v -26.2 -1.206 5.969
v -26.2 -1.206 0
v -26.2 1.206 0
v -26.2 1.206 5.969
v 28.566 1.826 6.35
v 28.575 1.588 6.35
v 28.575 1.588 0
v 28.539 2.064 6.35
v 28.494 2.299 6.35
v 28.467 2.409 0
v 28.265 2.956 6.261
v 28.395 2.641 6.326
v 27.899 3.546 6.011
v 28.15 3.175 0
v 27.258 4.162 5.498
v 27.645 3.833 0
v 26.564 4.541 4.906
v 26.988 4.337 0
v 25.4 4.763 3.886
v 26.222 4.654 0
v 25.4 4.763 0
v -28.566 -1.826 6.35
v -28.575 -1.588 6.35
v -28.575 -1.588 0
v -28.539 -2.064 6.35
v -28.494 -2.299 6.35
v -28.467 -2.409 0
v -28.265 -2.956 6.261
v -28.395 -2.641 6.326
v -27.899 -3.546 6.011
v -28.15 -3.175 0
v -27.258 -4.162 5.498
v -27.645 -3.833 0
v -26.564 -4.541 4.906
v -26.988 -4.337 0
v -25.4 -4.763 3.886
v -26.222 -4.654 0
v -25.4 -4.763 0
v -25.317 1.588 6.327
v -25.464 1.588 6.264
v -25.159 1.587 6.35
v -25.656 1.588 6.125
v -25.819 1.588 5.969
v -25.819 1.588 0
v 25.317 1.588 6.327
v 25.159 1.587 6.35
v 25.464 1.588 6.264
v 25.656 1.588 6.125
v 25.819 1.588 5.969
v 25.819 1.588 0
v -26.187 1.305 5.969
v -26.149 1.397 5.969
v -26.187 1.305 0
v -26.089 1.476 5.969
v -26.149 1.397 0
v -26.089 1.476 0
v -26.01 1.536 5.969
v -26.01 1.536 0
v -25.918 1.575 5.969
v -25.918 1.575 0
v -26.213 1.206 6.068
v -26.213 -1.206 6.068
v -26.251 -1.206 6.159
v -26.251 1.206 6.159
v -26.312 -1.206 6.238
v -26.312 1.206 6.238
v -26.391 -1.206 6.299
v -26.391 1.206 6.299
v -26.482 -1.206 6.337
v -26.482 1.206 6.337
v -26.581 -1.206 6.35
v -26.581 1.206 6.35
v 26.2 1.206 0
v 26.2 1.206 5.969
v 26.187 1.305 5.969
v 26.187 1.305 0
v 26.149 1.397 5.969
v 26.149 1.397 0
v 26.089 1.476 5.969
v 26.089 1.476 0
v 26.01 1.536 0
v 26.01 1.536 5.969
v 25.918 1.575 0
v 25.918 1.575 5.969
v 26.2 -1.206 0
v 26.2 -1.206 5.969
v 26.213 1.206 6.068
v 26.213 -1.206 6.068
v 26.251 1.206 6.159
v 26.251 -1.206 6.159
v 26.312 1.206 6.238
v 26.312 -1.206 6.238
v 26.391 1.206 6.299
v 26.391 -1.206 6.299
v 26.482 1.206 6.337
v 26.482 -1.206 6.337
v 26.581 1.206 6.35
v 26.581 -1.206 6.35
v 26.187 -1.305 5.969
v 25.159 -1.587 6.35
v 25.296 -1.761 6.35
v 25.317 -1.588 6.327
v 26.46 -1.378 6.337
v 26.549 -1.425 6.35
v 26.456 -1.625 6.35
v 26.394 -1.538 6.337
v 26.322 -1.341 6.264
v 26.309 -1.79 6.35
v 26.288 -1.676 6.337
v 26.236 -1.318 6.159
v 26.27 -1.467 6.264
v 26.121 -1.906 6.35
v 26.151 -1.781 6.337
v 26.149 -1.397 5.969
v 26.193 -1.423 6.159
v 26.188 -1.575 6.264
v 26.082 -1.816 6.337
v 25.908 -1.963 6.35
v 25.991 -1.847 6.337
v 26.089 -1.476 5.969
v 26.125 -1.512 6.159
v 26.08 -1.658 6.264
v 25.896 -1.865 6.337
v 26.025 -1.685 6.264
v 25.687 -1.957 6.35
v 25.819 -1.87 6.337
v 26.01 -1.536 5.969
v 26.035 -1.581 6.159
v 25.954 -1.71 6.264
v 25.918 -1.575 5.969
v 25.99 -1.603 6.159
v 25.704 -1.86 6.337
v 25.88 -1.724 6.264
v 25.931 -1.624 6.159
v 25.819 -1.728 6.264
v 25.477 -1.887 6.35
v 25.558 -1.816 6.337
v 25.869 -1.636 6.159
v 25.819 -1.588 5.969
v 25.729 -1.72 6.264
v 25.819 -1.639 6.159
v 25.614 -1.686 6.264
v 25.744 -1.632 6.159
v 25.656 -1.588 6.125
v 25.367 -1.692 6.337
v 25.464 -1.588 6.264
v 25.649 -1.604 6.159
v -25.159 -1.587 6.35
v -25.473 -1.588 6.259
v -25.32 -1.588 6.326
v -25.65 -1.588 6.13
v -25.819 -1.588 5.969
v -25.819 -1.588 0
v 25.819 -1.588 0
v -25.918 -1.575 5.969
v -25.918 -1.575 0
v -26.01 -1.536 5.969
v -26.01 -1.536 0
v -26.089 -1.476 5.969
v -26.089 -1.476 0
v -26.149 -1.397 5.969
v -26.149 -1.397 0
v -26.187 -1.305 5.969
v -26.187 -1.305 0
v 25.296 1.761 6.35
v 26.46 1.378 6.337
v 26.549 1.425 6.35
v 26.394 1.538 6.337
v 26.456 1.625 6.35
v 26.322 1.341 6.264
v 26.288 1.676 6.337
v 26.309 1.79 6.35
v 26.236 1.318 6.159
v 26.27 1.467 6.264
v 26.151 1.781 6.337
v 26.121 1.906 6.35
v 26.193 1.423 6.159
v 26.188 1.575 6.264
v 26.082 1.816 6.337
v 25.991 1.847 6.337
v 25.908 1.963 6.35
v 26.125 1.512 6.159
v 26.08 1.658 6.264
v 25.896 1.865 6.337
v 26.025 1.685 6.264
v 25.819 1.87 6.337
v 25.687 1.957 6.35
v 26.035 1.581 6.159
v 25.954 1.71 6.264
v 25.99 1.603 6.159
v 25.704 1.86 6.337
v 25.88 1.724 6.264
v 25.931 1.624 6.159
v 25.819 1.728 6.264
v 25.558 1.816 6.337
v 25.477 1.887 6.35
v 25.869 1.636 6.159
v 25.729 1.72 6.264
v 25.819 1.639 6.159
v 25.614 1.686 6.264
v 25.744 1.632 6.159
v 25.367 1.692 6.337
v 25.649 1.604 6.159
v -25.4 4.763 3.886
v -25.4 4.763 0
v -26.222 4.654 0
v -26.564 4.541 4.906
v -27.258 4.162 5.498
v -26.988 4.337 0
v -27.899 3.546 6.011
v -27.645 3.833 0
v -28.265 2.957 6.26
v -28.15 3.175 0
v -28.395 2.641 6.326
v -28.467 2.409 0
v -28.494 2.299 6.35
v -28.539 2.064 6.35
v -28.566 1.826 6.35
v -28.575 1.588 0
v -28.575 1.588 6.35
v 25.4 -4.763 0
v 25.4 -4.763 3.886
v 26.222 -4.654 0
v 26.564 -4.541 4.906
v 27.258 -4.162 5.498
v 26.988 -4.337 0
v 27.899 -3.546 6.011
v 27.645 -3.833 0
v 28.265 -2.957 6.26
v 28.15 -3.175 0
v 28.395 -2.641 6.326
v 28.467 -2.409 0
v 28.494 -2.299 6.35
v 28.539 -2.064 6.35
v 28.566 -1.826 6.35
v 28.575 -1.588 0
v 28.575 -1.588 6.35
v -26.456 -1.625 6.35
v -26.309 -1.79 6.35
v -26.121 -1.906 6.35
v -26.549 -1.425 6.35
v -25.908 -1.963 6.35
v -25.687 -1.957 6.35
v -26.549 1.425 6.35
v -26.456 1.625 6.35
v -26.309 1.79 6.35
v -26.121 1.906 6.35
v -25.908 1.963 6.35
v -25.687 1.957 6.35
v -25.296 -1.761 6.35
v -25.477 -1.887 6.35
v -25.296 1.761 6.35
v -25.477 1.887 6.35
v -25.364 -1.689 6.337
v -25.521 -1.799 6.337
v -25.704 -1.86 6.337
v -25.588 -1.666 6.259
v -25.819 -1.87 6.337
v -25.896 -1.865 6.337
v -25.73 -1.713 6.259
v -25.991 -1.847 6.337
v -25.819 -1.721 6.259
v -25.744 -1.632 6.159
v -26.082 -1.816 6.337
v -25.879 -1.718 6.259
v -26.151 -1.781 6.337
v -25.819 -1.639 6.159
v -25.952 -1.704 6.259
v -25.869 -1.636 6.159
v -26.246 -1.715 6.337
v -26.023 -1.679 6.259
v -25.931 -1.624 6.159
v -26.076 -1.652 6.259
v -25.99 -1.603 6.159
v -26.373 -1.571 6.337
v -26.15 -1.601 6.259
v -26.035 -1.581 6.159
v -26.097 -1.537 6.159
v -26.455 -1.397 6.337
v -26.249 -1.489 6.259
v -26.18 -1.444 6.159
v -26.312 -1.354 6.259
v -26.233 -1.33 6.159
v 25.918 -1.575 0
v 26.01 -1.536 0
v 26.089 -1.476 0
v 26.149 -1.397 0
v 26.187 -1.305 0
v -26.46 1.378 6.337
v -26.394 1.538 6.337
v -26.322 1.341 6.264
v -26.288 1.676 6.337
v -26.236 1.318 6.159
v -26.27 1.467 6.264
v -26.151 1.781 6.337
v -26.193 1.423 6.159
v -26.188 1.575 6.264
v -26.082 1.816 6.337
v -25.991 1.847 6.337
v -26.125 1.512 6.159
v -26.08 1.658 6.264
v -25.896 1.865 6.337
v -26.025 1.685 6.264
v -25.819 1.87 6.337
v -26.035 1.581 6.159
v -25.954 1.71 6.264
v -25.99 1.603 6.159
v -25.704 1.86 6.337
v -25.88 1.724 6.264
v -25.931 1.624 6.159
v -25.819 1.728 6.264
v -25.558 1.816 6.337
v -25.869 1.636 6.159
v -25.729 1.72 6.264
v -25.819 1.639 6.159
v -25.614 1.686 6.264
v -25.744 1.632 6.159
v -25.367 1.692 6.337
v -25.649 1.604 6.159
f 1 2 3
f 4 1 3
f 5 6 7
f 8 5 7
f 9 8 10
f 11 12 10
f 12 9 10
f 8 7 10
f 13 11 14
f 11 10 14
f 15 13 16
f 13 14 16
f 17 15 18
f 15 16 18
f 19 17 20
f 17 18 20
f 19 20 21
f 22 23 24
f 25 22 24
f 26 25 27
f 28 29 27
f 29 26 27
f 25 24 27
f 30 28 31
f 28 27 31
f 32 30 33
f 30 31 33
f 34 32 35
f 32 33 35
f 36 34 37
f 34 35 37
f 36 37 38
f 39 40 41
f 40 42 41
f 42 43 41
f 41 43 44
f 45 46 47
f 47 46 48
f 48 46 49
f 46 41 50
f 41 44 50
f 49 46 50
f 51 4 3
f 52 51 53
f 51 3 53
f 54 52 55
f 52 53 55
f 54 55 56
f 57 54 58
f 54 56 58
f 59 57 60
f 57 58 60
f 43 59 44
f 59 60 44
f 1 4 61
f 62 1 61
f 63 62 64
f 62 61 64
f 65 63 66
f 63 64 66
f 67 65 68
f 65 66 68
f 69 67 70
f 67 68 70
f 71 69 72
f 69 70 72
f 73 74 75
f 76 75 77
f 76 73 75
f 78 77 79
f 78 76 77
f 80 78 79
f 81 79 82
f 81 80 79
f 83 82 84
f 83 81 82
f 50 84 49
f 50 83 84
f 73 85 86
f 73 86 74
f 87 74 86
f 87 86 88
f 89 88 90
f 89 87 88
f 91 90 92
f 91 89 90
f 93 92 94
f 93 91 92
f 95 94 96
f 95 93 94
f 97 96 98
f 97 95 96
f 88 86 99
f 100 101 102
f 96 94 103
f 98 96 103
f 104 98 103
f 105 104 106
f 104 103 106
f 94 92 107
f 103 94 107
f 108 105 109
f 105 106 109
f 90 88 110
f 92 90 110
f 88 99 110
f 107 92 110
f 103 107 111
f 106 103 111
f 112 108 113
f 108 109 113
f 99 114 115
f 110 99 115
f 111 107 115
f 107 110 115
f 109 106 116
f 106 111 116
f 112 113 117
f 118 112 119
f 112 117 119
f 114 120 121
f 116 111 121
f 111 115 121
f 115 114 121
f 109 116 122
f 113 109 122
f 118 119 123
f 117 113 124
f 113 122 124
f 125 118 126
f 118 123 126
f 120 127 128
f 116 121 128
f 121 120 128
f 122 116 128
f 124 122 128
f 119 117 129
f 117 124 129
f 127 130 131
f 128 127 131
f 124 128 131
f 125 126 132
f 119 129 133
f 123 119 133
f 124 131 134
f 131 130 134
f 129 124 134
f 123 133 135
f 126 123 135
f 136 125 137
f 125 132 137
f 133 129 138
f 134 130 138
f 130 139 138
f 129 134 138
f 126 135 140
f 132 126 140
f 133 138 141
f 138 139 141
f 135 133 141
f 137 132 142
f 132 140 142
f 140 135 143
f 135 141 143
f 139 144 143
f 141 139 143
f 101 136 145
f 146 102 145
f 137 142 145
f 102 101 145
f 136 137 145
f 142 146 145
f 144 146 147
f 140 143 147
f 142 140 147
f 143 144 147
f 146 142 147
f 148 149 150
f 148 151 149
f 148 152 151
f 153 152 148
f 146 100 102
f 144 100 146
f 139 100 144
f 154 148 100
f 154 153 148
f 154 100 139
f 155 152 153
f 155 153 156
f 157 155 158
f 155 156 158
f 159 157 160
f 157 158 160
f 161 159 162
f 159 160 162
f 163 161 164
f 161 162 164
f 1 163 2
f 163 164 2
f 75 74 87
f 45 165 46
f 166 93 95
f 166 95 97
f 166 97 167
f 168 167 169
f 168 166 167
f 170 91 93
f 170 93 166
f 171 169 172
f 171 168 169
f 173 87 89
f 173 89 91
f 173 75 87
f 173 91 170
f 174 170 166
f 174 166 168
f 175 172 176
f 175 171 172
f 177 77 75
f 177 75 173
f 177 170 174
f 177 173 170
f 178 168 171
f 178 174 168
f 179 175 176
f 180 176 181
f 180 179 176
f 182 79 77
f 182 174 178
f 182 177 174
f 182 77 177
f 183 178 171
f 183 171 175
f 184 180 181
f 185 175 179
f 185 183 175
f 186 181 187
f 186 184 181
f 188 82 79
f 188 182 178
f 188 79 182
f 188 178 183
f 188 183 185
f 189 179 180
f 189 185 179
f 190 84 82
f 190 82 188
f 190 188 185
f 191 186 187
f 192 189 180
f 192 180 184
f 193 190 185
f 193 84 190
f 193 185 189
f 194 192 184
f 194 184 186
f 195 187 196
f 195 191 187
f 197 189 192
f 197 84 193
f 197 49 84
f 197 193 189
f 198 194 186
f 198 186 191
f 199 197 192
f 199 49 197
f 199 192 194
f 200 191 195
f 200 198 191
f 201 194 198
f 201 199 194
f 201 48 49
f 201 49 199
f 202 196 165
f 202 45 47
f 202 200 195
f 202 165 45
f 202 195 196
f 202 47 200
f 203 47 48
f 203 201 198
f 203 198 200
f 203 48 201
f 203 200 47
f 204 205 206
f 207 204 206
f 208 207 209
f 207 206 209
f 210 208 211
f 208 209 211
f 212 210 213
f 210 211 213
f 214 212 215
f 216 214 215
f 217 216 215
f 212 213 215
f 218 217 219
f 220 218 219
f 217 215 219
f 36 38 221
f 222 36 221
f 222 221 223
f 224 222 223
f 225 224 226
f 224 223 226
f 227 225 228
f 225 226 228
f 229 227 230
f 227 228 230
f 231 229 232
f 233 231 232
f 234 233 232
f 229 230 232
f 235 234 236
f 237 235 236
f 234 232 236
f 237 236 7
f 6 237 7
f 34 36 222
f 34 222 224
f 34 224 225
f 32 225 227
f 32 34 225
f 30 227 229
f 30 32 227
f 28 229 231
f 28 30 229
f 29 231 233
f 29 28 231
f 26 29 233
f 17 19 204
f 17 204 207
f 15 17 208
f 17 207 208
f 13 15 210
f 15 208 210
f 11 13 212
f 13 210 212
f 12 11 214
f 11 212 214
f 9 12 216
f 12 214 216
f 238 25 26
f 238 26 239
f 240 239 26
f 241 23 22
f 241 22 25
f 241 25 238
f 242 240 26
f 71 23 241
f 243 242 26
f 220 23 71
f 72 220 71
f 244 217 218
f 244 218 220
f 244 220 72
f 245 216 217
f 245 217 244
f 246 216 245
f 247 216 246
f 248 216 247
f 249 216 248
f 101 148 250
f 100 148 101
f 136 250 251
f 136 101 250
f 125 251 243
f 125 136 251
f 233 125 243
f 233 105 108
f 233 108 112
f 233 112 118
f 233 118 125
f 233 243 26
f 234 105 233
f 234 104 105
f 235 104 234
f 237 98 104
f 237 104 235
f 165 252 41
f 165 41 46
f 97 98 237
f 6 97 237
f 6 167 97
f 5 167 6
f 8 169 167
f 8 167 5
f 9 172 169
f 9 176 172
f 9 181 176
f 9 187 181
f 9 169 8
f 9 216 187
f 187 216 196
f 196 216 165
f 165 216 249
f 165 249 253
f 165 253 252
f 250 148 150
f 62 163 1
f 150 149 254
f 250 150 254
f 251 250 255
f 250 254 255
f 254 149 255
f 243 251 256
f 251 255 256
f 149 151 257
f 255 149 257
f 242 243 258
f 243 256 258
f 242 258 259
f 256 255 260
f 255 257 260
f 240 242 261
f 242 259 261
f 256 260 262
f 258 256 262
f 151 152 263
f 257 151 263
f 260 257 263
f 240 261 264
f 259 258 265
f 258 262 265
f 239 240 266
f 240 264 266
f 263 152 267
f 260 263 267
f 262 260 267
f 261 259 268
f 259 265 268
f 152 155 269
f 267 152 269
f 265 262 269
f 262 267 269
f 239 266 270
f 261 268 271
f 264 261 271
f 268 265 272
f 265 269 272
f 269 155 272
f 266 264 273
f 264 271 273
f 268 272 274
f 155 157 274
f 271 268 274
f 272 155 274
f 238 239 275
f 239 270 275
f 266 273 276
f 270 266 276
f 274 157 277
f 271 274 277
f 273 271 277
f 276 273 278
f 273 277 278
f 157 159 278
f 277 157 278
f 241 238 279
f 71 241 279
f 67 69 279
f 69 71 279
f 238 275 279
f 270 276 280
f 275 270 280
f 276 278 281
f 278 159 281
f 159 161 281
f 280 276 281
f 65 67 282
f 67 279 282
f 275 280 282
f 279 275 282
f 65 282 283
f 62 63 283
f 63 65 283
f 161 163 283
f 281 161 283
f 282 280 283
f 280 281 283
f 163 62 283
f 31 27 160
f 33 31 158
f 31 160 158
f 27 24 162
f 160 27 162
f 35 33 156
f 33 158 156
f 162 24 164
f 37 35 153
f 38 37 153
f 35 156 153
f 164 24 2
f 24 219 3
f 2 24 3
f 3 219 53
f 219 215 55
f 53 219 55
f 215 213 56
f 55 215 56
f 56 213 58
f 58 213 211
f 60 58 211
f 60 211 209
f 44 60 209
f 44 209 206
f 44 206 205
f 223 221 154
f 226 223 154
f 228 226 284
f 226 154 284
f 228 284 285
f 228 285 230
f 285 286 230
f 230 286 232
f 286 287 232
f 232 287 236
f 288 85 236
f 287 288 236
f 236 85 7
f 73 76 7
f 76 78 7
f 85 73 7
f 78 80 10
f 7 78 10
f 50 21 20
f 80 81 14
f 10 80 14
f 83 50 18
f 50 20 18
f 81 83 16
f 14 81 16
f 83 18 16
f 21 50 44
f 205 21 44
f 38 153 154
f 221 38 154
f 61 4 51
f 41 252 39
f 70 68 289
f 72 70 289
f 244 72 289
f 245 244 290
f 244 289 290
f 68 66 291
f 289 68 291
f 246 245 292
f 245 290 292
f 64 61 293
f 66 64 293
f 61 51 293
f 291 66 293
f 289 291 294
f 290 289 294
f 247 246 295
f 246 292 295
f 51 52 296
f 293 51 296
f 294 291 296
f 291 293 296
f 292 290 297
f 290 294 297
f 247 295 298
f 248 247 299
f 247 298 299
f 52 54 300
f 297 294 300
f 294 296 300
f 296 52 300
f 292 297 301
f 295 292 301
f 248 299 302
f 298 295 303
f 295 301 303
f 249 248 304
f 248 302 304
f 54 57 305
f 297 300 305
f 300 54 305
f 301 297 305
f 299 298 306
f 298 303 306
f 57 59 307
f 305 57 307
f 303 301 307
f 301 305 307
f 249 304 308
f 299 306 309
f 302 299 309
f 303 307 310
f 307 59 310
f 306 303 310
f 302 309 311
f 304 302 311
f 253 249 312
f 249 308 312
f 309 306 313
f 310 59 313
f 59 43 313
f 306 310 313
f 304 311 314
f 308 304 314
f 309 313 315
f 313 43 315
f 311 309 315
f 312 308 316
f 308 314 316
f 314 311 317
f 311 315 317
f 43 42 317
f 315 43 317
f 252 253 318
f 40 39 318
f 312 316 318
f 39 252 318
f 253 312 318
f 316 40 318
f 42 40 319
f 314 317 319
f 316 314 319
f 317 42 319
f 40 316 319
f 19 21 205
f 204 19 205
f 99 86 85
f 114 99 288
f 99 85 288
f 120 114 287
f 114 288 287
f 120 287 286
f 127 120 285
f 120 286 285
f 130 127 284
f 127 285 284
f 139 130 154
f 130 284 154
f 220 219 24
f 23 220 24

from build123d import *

# Parameters (mm, degrees)
F0_W         = 52.4002
F0_H         = 3.175
F1_DEPTH     = 6.35
F2_T1_DEPTH  = 63.119
F3_T1_DEPTH  = 6.35
F3_T3_DEPTH  = 2.413
F3_T6_ANGLE  = 233.2969892374
F3_T8_ANGLE  = 233.2969892374
F3_T10_ANGLE = 233.2969892374
F3_T12_ANGLE = 233.2969892374


# Not quite as in the source:
# - a fillet or chamfer that OpenCascade refuses, or shapes differently, is made with other operations: its cross-section is extruded or revolved along the edge and cut away or added


with BuildPart() as f1:
    # F0 (on Top) → F1 (new body)
    with BuildSketch(Plane.XY):
        with BuildLine():
            Line((25.4, 4.7625), (-25.4, 4.7625))
            ThreePointArc((-25.4, 4.7625), (-27.6450640303, 3.8325640303), (-28.575, 1.5875))
            Line((-28.575, 1.5875), (-28.575, -1.5875))
            ThreePointArc((-28.575, -1.5875), (-27.6450640303, -3.8325640303), (-25.4, -4.7625))
            Line((-25.4, -4.7625), (25.4, -4.7625))
            ThreePointArc((25.4, -4.7625), (27.6450640303, -3.8325640303), (28.575, -1.5875))
            Line((28.575, -1.5875), (28.575, 1.5875))
            ThreePointArc((28.575, 1.5875), (27.6450640303, 3.8325640303), (25.4, 4.7625))
        make_face()
        Rectangle(F0_W, F0_H, mode=Mode.SUBTRACT)
    extrude(amount=F1_DEPTH)

    # F2: fillet of radius 2.4638 on 2 edges, made by hand

    # F2_s2 → F2_t1 (cut)
    with BuildSketch(Plane.YZ.offset(-31.5595)):
        with BuildLine():
            ThreePointArc((-4.7625, 3.8862), (-4.0408696875, 5.6283696875), (-2.2987, 6.35))
            Line((-2.2987, 6.35), (-4.7625, 6.35))
            Line((-4.7625, 6.35), (-4.7625, 3.8862))
        make_face()
        with BuildLine():
            ThreePointArc((4.7625, 3.8862), (4.0408696875, 5.6283696875), (2.2987, 6.35))
            Line((2.2987, 6.35), (4.7625, 6.35))
            Line((4.7625, 6.35), (4.7625, 3.8862))
        make_face()
    extrude(amount=F2_T1_DEPTH, mode=Mode.SUBTRACT)

    # F3: fillet of radius 0.381 on 6 edges, made by hand

    # F3_s2 → F3_t1 (join)
    with BuildSketch(Plane.XY):
        with BuildLine():
            ThreePointArc((-26.2001, 1.2065), (-26.0885076836, 1.4759076836), (-25.8191, 1.5875))
            Line((-25.8191, 1.5875), (-26.2001, 1.5875))
            Line((-26.2001, 1.5875), (-26.2001, 1.2065))
        make_face()
        with BuildLine():
            ThreePointArc((26.2001, 1.2065), (26.0885076836, 1.4759076836), (25.8191, 1.5875))
            Line((25.8191, 1.5875), (26.2001, 1.5875))
            Line((26.2001, 1.5875), (26.2001, 1.2065))
        make_face()
        with BuildLine():
            ThreePointArc((26.2001, -1.2065), (26.0885076836, -1.4759076836), (25.8191, -1.5875))
            Line((25.8191, -1.5875), (26.2001, -1.5875))
            Line((26.2001, -1.5875), (26.2001, -1.2065))
        make_face()
        with BuildLine():
            ThreePointArc((-25.8191, -1.5875), (-26.0885076836, -1.4759076836), (-26.2001, -1.2065))
            Line((-26.2001, -1.2065), (-26.2001, -1.5875))
            Line((-26.2001, -1.5875), (-25.8191, -1.5875))
        make_face()
    extrude(amount=F3_T1_DEPTH)

    # F3_s4 → F3_t3 (cut)
    with BuildSketch(Plane.XZ.offset(-1.2065)):
        with BuildLine():
            ThreePointArc((-26.2001, 5.969), (-26.3116923164, 6.2384076836), (-26.5811, 6.35))
            Line((-26.5811, 6.35), (-26.2001, 6.35))
            Line((-26.2001, 6.35), (-26.2001, 5.969))
        make_face()
        with BuildLine():
            ThreePointArc((26.2001, 5.969), (26.3116923164, 6.2384076836), (26.5811, 6.35))
            Line((26.5811, 6.35), (26.2001, 6.35))
            Line((26.2001, 6.35), (26.2001, 5.969))
        make_face()
    extrude(amount=F3_T3_DEPTH, mode=Mode.SUBTRACT)

    # F3_s5 → F3_t6 (revolve, cut)
    with BuildSketch(Plane.XZ.offset(-1.2065)):
        with BuildLine():
            ThreePointArc((26.5811, 6.35), (26.3116923164, 6.2384076836), (26.2001, 5.969))
            Line((26.2001, 5.969), (26.2001, 6.35))
            Line((26.2001, 6.35), (26.5811, 6.35))
        make_face()
    revolve(axis=Axis((25.8191, 1.2065, 6.35), (0, 0, 1)), revolution_arc=F3_T6_ANGLE, mode=Mode.SUBTRACT)

    # F3_s7 → F3_t8 (revolve, cut)
    with BuildSketch(Plane.XZ.offset(1.2065)):
        with BuildLine():
            ThreePointArc((26.5811, 6.35), (26.3116923164, 6.2384076836), (26.2001, 5.969))
            Line((26.2001, 5.969), (26.2001, 6.35))
            Line((26.2001, 6.35), (26.5811, 6.35))
        make_face()
    revolve(axis=Axis((25.8191, -1.2065, 6.35), (0, 0, -1)), revolution_arc=F3_T8_ANGLE, mode=Mode.SUBTRACT)

    # F3_s9 → F3_t10 (revolve, cut)
    with BuildSketch(Plane(origin=(-16.0182318513, 11.9409314764, 0), x_dir=(0, 0, 1), z_dir=(-0.8017442393, 0.5976672776, 0))):
        with BuildLine():
            ThreePointArc((6.35, -15.6365356326), (6.2384076836, -15.9059433163), (5.969, -16.0175356326))
            Line((5.969, -16.0175356326), (6.35, -16.0175356326))
            Line((6.35, -16.0175356326), (6.35, -15.6365356326))
        make_face()
    revolve(axis=Axis((-25.8191, -1.2065, 6.35), (0, 0, -1)), revolution_arc=F3_T10_ANGLE, mode=Mode.SUBTRACT)

    # F3_s11 → F3_t12 (revolve, cut)
    with BuildSketch(Plane.XZ.offset(-1.2065)):
        with BuildLine():
            ThreePointArc((-26.5811, 6.35), (-26.3116923164, 6.2384076836), (-26.2001, 5.969))
            Line((-26.2001, 5.969), (-26.2001, 6.35))
            Line((-26.2001, 6.35), (-26.5811, 6.35))
        make_face()
    revolve(axis=Axis((-25.8191, 1.2065, 6.35), (0, 0, -1)), revolution_arc=F3_T12_ANGLE, mode=Mode.SUBTRACT)


solid = f1.part
